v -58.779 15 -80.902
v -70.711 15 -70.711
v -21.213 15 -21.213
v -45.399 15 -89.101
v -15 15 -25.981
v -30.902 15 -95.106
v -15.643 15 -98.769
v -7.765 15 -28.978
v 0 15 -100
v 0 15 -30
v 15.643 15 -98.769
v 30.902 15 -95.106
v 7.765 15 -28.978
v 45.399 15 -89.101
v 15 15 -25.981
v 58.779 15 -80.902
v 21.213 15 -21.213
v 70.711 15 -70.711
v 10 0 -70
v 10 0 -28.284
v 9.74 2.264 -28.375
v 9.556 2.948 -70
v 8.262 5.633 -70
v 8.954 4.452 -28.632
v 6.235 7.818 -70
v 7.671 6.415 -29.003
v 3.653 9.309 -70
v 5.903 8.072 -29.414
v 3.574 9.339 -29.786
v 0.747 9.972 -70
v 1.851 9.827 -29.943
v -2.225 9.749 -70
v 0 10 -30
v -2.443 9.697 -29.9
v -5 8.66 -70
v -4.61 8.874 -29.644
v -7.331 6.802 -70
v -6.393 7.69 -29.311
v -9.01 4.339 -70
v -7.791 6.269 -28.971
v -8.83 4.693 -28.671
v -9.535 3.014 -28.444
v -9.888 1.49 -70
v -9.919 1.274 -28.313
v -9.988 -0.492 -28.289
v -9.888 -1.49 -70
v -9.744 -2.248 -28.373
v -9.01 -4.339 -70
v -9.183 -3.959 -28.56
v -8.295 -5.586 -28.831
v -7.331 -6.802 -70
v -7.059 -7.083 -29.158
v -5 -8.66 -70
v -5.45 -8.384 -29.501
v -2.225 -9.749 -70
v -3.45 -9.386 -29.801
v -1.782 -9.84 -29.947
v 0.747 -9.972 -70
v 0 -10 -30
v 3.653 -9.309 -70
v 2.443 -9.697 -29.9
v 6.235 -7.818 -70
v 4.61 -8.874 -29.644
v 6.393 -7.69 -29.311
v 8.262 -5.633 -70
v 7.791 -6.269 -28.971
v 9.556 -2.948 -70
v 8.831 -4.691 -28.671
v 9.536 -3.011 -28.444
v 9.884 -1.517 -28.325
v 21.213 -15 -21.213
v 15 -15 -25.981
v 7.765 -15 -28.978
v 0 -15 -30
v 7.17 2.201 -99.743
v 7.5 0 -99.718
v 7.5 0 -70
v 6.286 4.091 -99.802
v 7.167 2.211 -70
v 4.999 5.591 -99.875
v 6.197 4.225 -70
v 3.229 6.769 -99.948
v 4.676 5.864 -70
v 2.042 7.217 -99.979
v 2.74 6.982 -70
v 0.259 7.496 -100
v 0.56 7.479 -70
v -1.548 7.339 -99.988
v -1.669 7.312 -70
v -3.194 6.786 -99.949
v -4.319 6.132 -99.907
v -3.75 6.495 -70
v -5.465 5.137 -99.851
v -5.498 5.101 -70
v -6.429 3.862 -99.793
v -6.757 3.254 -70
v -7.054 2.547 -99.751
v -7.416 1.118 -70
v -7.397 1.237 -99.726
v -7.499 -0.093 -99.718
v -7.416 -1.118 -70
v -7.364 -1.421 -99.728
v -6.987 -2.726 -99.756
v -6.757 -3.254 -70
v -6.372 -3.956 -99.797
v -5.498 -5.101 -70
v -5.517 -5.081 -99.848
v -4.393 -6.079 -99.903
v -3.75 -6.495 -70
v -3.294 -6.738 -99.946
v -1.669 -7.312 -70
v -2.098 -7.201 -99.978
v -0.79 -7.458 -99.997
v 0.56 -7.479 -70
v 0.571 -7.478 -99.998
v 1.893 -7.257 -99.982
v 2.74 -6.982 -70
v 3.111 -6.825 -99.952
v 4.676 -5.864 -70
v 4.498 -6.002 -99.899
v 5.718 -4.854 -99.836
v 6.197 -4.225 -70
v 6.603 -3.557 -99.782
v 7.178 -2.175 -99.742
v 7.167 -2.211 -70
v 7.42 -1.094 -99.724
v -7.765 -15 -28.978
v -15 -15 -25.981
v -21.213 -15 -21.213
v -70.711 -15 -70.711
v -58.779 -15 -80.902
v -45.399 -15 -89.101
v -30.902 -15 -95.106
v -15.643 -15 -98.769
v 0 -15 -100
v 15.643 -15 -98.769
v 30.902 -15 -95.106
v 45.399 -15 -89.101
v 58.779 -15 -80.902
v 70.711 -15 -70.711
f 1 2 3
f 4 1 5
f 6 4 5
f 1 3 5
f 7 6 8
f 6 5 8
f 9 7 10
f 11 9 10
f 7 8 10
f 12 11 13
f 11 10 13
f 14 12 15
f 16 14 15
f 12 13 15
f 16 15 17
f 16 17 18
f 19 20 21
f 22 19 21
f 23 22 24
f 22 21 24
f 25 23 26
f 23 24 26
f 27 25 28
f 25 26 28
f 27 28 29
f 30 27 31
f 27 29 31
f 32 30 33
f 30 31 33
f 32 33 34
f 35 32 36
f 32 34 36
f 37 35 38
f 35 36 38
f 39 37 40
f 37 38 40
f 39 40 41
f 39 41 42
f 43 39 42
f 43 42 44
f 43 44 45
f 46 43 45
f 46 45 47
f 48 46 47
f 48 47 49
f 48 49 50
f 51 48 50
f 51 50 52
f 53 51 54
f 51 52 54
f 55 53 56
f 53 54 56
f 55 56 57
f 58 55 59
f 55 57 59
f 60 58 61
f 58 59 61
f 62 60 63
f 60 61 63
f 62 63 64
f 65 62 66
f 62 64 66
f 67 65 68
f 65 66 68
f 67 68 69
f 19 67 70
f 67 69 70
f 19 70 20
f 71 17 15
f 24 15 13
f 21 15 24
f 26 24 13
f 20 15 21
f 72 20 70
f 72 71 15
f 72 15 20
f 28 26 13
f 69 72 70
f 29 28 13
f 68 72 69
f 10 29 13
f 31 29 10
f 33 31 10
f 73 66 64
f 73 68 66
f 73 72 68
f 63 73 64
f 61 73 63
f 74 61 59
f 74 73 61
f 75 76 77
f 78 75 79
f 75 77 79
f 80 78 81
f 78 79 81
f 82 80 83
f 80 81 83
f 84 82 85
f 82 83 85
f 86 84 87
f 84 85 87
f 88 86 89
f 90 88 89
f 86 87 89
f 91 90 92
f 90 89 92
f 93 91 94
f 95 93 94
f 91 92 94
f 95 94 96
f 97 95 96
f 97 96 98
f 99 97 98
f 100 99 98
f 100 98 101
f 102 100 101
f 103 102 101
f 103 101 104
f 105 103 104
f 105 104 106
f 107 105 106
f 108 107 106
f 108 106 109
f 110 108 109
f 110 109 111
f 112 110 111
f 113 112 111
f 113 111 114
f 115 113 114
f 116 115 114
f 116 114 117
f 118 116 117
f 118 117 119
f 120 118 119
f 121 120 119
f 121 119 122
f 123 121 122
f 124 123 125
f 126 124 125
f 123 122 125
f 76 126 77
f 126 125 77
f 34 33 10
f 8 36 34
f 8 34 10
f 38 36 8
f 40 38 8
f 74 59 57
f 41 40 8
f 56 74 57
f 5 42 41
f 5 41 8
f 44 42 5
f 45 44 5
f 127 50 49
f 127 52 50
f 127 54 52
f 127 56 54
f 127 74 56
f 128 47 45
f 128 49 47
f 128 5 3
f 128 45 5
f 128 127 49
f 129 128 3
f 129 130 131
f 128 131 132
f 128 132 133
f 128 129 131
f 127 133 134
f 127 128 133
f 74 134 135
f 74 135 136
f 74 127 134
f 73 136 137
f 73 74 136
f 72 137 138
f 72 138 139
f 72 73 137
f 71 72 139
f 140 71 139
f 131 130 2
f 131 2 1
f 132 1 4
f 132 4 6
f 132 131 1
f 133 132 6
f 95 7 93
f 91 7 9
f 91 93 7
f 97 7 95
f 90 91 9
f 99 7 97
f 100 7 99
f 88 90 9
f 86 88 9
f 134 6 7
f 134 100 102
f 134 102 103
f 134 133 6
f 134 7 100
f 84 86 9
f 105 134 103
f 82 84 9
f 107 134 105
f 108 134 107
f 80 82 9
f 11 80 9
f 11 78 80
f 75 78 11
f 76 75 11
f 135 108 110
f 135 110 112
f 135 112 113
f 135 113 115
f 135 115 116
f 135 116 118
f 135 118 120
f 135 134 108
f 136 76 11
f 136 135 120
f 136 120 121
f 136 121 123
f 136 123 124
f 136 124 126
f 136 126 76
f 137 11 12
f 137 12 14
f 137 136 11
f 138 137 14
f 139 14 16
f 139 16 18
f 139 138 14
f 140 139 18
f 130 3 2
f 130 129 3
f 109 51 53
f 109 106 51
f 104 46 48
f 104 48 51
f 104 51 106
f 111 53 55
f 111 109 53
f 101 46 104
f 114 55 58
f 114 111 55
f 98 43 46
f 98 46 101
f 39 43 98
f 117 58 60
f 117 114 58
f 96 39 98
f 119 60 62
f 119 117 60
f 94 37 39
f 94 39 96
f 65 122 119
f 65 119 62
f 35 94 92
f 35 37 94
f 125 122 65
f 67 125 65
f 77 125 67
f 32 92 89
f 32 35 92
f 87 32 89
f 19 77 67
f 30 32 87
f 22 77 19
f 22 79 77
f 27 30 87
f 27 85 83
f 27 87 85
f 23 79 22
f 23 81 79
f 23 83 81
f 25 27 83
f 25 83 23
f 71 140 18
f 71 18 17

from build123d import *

# Parameters (mm, degrees)
F1_DEPTH = 15
F2_R     = 7.5
F3_DEPTH = 105.450168252
F4_R     = 10
F5_DEPTH = 70


with BuildPart() as f1:
    # F0 (on Front) → F1 (new body, symmetric)
    with BuildSketch(Plane.XZ):
        with BuildLine():
            Line((-21.2132034356, -21.2132034356), (-70.7106781187, -70.7106781187))
            ThreePointArc((-70.7106781187, -70.7106781187), (-38.2683432365, -92.3879532511), (0, -100))
            Line((0, -100), (0, -30))
            ThreePointArc((0, -30), (-11.480502971, -27.7163859753), (-21.2132034356, -21.2132034356))
        make_face()
        with BuildLine():
            Line((0, -30), (0, -100))
            ThreePointArc((0, -100), (38.2683432365, -92.3879532511), (70.7106781187, -70.7106781187))
            Line((70.7106781187, -70.7106781187), (21.2132034356, -21.2132034356))
            ThreePointArc((21.2132034356, -21.2132034356), (11.480502971, -27.7163859753), (0, -30))
        make_face()
    extrude(amount=F1_DEPTH, both=True)

    # F2 (on Top) → F3 (cut)
    with BuildSketch(Plane.XY):
        Circle(F2_R)
    extrude(amount=-F3_DEPTH, mode=Mode.SUBTRACT)

    # F4 (on Top) → F5 (cut)
    with BuildSketch(Plane.XY):
        Circle(F4_R)
    extrude(amount=-F5_DEPTH, mode=Mode.SUBTRACT)


solid = f1.part
